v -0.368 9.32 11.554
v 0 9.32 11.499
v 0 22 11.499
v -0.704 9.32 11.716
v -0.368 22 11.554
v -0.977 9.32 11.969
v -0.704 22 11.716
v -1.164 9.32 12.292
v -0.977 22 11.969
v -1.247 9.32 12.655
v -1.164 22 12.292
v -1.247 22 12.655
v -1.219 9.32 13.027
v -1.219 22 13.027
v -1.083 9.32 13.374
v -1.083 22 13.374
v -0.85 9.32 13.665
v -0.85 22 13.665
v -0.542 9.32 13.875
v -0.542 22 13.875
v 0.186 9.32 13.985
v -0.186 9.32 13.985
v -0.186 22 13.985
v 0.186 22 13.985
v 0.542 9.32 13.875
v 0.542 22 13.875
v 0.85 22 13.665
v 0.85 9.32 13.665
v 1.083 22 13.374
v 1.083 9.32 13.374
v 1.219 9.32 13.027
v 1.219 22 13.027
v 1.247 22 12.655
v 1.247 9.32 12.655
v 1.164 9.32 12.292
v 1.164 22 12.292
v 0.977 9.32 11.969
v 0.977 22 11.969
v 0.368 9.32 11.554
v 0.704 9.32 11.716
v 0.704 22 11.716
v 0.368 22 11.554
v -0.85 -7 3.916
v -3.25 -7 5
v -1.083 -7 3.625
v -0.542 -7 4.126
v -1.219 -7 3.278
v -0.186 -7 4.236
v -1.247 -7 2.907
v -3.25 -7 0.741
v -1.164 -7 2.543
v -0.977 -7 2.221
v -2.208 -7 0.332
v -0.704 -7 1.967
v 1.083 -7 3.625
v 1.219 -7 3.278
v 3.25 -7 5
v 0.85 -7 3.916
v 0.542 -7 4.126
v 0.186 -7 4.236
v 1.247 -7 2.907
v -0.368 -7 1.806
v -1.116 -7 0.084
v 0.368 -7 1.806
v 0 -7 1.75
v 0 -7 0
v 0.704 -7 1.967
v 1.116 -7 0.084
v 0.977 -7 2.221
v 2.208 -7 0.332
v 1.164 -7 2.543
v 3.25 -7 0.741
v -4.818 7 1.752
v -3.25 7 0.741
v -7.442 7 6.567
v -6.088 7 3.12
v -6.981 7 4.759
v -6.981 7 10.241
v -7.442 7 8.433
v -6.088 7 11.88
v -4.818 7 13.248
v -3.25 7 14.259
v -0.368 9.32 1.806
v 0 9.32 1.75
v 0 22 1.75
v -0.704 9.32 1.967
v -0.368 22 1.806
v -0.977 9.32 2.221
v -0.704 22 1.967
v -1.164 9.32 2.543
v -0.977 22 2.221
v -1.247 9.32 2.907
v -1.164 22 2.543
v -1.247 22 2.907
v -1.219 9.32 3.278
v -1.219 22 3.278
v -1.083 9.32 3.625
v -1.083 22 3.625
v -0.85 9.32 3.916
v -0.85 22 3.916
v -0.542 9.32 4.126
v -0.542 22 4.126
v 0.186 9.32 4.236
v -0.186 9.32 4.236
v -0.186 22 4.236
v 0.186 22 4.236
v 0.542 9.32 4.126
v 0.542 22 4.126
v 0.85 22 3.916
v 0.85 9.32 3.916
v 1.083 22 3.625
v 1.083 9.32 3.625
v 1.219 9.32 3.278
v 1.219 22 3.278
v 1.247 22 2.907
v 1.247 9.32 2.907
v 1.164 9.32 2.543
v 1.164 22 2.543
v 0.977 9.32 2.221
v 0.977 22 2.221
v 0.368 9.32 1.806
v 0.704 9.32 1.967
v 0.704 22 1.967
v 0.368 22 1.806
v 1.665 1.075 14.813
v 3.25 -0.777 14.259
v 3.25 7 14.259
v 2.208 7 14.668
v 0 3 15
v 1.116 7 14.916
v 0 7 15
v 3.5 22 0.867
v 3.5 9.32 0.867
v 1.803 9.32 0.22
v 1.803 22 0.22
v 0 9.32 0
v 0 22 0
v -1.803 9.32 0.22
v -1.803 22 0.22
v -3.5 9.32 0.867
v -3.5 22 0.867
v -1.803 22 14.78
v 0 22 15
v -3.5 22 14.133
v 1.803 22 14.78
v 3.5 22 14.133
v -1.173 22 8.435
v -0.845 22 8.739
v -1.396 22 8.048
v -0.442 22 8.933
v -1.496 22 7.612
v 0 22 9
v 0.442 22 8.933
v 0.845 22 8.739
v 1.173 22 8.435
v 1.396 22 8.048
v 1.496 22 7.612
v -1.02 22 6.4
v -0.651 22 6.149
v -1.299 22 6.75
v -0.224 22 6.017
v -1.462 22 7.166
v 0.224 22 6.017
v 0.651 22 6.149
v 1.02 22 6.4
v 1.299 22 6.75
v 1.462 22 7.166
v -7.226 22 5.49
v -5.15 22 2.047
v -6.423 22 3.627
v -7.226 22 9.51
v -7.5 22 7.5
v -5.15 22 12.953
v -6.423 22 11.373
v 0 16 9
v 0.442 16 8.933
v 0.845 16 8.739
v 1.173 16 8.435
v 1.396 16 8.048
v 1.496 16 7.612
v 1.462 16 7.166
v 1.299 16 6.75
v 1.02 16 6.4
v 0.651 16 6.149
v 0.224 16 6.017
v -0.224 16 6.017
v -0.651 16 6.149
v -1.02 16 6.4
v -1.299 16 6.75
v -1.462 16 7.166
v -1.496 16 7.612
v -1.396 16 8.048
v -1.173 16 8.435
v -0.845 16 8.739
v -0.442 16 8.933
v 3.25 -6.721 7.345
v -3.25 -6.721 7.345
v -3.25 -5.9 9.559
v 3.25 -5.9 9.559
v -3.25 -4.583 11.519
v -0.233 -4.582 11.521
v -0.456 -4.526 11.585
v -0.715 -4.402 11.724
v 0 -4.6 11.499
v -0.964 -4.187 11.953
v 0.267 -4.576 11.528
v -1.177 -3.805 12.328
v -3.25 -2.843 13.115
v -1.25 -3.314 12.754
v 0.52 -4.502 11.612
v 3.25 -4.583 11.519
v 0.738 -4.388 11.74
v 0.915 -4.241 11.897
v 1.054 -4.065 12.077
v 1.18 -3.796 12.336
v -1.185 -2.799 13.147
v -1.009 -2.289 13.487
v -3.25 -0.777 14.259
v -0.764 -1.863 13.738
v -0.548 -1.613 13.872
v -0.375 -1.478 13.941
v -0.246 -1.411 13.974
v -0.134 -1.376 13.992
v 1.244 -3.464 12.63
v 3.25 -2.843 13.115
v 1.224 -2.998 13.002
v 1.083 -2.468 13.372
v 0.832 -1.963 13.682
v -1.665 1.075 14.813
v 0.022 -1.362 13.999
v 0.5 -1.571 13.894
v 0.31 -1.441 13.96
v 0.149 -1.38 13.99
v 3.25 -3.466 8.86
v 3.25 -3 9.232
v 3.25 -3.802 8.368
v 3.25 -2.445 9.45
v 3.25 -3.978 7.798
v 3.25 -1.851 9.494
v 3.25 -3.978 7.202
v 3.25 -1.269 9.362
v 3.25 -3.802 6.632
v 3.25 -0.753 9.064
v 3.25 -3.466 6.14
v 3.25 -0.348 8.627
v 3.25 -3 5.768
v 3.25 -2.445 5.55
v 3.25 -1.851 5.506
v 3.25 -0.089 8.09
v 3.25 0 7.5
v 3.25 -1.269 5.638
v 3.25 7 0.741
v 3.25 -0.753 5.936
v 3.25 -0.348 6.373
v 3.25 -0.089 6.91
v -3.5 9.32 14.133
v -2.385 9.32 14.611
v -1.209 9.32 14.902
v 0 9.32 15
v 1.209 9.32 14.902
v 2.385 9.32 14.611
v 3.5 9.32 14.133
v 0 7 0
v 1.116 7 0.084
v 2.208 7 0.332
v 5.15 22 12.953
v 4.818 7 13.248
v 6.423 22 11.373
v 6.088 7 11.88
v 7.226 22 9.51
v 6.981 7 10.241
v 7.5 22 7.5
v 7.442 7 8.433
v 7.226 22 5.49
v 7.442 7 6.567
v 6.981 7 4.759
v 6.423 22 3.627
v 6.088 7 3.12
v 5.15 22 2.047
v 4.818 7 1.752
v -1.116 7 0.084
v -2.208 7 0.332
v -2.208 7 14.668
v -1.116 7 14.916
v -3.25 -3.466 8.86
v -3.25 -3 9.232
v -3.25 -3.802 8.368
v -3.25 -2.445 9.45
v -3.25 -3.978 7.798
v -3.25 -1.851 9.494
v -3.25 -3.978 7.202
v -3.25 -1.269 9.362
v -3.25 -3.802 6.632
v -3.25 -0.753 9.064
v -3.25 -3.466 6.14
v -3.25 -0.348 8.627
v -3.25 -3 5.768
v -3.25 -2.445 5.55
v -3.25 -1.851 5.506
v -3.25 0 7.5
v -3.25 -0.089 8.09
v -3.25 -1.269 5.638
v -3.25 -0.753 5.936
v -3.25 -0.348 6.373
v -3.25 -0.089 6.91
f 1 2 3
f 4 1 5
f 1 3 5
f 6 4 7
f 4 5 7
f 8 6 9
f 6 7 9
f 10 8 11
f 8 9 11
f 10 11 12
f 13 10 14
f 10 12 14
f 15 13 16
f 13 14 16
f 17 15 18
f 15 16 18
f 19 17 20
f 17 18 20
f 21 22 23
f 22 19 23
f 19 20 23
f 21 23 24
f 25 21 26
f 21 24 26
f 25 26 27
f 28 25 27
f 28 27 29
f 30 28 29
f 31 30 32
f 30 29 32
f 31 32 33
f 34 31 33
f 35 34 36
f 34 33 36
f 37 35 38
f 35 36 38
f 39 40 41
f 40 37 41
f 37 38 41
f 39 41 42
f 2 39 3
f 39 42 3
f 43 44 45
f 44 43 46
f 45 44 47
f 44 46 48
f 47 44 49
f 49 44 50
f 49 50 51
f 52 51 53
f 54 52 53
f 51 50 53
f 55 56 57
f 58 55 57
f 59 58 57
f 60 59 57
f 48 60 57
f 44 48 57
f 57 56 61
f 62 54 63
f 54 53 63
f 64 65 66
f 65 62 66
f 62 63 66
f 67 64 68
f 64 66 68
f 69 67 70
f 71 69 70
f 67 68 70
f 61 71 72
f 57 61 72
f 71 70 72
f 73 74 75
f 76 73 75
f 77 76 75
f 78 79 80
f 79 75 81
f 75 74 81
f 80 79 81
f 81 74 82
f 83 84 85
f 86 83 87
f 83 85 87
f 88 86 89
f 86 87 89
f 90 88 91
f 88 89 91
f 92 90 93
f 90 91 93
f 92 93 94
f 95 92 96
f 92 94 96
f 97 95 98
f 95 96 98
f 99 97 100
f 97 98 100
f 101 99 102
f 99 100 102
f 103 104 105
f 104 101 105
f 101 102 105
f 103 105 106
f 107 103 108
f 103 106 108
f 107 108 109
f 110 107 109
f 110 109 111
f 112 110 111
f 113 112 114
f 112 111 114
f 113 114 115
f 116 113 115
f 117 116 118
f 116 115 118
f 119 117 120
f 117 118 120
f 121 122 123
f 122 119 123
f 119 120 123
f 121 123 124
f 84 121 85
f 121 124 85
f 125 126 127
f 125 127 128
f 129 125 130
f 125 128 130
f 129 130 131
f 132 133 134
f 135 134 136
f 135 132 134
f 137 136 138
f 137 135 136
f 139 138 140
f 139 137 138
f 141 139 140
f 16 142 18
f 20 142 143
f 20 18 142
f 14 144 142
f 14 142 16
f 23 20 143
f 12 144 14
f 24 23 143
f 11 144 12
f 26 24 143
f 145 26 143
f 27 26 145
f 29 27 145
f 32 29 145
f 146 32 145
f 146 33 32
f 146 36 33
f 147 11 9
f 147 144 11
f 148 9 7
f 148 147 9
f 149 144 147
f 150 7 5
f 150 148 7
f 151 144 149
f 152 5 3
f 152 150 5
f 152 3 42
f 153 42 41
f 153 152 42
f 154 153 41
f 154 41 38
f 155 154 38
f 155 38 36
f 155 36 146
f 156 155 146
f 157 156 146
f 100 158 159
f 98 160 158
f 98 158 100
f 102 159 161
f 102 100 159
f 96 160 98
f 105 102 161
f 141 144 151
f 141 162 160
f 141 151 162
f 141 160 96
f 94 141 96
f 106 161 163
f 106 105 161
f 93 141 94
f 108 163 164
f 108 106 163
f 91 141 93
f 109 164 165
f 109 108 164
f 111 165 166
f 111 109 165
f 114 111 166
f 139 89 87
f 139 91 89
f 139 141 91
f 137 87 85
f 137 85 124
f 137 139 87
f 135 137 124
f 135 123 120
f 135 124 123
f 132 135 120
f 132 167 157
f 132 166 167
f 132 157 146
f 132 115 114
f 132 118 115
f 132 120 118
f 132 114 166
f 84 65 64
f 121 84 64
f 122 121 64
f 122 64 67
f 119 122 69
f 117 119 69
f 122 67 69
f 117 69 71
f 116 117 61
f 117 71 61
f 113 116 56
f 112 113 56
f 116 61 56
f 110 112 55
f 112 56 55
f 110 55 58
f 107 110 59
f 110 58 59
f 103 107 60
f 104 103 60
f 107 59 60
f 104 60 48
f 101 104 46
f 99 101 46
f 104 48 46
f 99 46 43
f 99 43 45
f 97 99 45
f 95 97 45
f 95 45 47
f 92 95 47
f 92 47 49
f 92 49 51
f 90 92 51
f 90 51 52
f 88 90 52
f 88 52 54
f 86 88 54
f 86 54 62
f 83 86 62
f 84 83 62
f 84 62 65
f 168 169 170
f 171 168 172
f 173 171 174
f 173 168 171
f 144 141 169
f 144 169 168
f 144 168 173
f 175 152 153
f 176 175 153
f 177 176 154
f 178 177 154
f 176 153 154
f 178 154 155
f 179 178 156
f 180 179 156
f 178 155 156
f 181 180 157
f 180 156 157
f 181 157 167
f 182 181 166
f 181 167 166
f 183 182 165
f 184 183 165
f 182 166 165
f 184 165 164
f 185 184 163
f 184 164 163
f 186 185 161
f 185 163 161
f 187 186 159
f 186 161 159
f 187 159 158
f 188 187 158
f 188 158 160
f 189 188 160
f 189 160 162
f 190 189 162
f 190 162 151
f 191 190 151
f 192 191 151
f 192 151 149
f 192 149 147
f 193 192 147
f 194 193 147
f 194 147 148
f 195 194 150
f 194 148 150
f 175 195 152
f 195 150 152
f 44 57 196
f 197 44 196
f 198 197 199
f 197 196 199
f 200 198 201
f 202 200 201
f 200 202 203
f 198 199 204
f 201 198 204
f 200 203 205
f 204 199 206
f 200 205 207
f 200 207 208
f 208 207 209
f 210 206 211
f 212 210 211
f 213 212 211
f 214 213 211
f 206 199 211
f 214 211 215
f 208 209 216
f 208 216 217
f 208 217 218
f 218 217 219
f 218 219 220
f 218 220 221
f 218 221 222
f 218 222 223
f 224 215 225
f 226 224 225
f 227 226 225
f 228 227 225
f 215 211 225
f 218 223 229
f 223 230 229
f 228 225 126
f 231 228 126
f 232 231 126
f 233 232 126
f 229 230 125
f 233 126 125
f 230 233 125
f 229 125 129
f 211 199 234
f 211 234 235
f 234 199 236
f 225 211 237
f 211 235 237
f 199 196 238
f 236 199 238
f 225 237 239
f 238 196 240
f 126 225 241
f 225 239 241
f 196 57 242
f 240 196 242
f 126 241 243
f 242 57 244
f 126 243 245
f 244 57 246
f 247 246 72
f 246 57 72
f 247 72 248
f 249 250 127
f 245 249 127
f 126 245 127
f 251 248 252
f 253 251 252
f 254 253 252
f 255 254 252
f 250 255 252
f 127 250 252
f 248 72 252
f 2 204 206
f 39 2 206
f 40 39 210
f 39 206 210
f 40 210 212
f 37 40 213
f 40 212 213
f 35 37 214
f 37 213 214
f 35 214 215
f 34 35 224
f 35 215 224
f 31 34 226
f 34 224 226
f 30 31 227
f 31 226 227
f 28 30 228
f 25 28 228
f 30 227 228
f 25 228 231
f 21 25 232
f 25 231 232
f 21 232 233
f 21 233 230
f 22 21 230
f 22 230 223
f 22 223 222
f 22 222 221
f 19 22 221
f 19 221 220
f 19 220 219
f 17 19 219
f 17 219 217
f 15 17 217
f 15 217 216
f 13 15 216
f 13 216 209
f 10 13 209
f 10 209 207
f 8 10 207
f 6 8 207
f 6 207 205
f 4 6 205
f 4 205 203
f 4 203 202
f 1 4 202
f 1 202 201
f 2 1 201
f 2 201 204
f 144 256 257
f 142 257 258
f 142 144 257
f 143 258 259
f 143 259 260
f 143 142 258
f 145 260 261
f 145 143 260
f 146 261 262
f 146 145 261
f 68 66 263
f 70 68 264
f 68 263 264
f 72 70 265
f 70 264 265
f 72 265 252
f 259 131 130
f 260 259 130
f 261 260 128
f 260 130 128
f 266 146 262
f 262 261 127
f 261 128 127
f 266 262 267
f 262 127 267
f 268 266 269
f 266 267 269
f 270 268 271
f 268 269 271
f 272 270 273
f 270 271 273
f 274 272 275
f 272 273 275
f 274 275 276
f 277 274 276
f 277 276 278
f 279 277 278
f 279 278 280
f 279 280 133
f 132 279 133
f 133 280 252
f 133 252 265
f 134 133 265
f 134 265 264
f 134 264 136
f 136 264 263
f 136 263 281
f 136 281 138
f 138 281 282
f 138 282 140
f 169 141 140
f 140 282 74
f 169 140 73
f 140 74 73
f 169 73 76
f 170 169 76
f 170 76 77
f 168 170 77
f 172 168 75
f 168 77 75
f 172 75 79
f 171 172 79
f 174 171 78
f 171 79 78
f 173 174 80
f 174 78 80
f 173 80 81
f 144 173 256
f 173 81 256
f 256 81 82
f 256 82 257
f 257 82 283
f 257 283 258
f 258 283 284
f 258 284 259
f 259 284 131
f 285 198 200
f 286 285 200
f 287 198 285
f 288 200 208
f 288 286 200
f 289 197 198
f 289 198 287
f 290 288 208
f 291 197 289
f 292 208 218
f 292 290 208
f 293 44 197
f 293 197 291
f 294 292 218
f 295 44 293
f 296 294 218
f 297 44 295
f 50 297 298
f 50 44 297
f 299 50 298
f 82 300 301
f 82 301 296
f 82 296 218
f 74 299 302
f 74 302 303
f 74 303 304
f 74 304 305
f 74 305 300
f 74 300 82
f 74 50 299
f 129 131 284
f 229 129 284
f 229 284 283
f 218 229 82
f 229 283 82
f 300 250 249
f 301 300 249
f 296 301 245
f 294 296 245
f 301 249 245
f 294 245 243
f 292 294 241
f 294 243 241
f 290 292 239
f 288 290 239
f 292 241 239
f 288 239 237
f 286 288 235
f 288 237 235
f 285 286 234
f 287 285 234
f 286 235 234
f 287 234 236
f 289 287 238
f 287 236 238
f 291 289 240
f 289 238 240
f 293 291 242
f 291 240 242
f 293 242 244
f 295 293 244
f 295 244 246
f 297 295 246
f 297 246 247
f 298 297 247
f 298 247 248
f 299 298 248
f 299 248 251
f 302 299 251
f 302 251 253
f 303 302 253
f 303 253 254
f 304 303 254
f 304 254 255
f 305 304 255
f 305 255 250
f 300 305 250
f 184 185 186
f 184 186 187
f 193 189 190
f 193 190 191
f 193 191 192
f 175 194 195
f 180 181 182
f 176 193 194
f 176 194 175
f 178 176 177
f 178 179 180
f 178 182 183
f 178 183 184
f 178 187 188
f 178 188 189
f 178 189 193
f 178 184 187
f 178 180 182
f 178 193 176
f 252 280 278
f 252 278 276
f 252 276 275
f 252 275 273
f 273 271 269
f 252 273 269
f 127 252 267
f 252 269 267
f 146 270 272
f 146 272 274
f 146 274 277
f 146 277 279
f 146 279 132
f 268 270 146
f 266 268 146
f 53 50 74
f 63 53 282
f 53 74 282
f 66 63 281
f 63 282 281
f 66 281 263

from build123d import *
from build123d.topology import SkipClean

# Parameters (mm, degrees)
SKETCH1_W           = 6.5
SKETCH1_H           = 14
BOSS_EXTRUDE1_DEPTH = 15
FILLET1_R           = 10
SKETCH2_R           = 2
CUT_EXTRUDE1_DEPTH  = 18.783419244
SKETCH4_R           = 7.5
BOSS_EXTRUDE2_DEPTH = 15
SKETCH6_W           = 7
SKETCH6_H           = 12.68
CUT_EXTRUDE2_DEPTH  = 28.663152387
CUT_EXTRUDE3_DEPTH  = 23.5
SKETCH11_R          = 1.25
CUT_EXTRUDE7_DEPTH  = 24
BOSS_EXTRUDE3_START = 12.68
SKETCH12_R          = 1.25
BOSS_EXTRUDE3_DEPTH = 12.68
SKETCH13_R          = 1.5
CUT_EXTRUDE8_DEPTH  = 6


with BuildPart() as part:
    # Sketch1 → Boss-Extrude1 (new body)
    with BuildSketch(Plane.XY):
        Rectangle(SKETCH1_W, SKETCH1_H)
    extrude(amount=BOSS_EXTRUDE1_DEPTH)

    # Fillet1
    fillet1_edges = [part.edges().sort_by_distance(p)[0] for p in [
        (0, -7, 15),
    ]]
    fillet(fillet1_edges, radius=FILLET1_R)

    # Sketch2 → Cut-Extrude1 (cut, through all)
    with BuildSketch(Plane(origin=(3.25, 0, 0), x_dir=(0, 0, -1), z_dir=(1, 0, 0))):
        with Locations(Location((-7.5, -2, 0), (0, 0, 90))):
            Circle(SKETCH2_R)
    extrude(amount=-CUT_EXTRUDE1_DEPTH, mode=Mode.SUBTRACT)

    # Sketch4 → Boss-Extrude2 (add)
    with BuildSketch(Plane(origin=(0, 7, 0), x_dir=(1, 0, 0), z_dir=(0, 1, 0))):
        with Locations(Location((0, -7.5, 0), (0, 0, 270))):
            Circle(SKETCH4_R)
    extrude(amount=BOSS_EXTRUDE2_DEPTH)

    # Sketch6 → Cut-Extrude2 (cut, through all)
    with BuildSketch(Plane(origin=(0, 0, 0), x_dir=(-1, 0, 0), z_dir=(0, 0, -1))):
        with Locations((0, 15.66)):
            Rectangle(SKETCH6_W, SKETCH6_H)
    extrude(amount=-CUT_EXTRUDE2_DEPTH, mode=Mode.SUBTRACT)

    # Sketch7 → Cut-Extrude3 (cut, through all)
    with BuildSketch(Plane(origin=(0, 7, 0), x_dir=(1, 0, 0), z_dir=(0, 1, 0))):
        with BuildLine():
            ThreePointArc((0, -15), (-1.666673801, -14.812468697), (-3.25, -14.259252917))
            Line((-3.25, -14.259252917), (-3.25, -15))
            Line((-3.25, -15), (0, -15))
        make_face()
        with BuildLine():
            ThreePointArc((3.25, -14.259252917), (1.666673801, -14.812468697), (0, -15))
            Line((0, -15), (3.25, -15))
            Line((3.25, -15), (3.25, -14.259252917))
        make_face()
        with BuildLine():
            ThreePointArc((-3.25, -0.740747083), (-1.666673801, -0.187531303), (0, 0))
            Line((0, 0), (-3.25, 0))
            Line((-3.25, 0), (-3.25, -0.740747083))
        make_face()
        with BuildLine():
            Line((3.25, 0), (0, 0))
            ThreePointArc((0, 0), (1.666673801, -0.187531303), (3.25, -0.740747083))
            Line((3.25, -0.740747083), (3.25, 0))
        make_face()
    extrude(amount=-CUT_EXTRUDE3_DEPTH, mode=Mode.SUBTRACT)

    # Sketch11 → Cut-Extrude7 (cut)
    with BuildSketch(Plane.XZ.offset(7)):
        with Locations(Location((0, 12.74882624, 0), (0, 0, 270))):
            Circle(SKETCH11_R)
        with Locations(Location((0, 3, 0), (0, 0, 270))):
            Circle(SKETCH11_R)
    extrude(amount=-CUT_EXTRUDE7_DEPTH, mode=Mode.SUBTRACT)

    # Sketch12 → Boss-Extrude3 (add)
    with SkipClean():  # the faces are left unmerged after this step: merging them gives an invalid solid
        with BuildSketch(Plane(origin=(0, 9.32, 0), x_dir=(1, 0, 0), z_dir=(0, 1, 0)).offset(BOSS_EXTRUDE3_START)):
            with BuildLine():
                Line((3.5, -14.133249581), (3.5, -0.866750419))
                ThreePointArc((3.5, -0.866750419), (0, 0), (-3.5, -0.866750419))
                Line((-3.5, -0.866750419), (-3.5, -14.133249581))
                ThreePointArc((-3.5, -14.133249581), (0, -15), (3.5, -14.133249581))
            make_face()
            with Locations(Location((0, -3, 0), (0, 0, 90))):
                Circle(SKETCH12_R, mode=Mode.SUBTRACT)
            with Locations(Location((0, -12.74882624, 0), (0, 0, 90))):
                Circle(SKETCH12_R, mode=Mode.SUBTRACT)
        extrude(amount=-BOSS_EXTRUDE3_DEPTH)

    # Sketch13 → Cut-Extrude8 (cut)
    with SkipClean():  # the faces are left unmerged after this step: merging them gives an invalid solid
        with BuildSketch(Plane(origin=(0, 22, 0), x_dir=(1, 0, 0), z_dir=(0, 1, 0))):
            with Locations(Location((0, -7.5, 0), (0, 0, 270))):
                Circle(SKETCH13_R)
        extrude(amount=-CUT_EXTRUDE8_DEPTH, mode=Mode.SUBTRACT)


solid = part.part
